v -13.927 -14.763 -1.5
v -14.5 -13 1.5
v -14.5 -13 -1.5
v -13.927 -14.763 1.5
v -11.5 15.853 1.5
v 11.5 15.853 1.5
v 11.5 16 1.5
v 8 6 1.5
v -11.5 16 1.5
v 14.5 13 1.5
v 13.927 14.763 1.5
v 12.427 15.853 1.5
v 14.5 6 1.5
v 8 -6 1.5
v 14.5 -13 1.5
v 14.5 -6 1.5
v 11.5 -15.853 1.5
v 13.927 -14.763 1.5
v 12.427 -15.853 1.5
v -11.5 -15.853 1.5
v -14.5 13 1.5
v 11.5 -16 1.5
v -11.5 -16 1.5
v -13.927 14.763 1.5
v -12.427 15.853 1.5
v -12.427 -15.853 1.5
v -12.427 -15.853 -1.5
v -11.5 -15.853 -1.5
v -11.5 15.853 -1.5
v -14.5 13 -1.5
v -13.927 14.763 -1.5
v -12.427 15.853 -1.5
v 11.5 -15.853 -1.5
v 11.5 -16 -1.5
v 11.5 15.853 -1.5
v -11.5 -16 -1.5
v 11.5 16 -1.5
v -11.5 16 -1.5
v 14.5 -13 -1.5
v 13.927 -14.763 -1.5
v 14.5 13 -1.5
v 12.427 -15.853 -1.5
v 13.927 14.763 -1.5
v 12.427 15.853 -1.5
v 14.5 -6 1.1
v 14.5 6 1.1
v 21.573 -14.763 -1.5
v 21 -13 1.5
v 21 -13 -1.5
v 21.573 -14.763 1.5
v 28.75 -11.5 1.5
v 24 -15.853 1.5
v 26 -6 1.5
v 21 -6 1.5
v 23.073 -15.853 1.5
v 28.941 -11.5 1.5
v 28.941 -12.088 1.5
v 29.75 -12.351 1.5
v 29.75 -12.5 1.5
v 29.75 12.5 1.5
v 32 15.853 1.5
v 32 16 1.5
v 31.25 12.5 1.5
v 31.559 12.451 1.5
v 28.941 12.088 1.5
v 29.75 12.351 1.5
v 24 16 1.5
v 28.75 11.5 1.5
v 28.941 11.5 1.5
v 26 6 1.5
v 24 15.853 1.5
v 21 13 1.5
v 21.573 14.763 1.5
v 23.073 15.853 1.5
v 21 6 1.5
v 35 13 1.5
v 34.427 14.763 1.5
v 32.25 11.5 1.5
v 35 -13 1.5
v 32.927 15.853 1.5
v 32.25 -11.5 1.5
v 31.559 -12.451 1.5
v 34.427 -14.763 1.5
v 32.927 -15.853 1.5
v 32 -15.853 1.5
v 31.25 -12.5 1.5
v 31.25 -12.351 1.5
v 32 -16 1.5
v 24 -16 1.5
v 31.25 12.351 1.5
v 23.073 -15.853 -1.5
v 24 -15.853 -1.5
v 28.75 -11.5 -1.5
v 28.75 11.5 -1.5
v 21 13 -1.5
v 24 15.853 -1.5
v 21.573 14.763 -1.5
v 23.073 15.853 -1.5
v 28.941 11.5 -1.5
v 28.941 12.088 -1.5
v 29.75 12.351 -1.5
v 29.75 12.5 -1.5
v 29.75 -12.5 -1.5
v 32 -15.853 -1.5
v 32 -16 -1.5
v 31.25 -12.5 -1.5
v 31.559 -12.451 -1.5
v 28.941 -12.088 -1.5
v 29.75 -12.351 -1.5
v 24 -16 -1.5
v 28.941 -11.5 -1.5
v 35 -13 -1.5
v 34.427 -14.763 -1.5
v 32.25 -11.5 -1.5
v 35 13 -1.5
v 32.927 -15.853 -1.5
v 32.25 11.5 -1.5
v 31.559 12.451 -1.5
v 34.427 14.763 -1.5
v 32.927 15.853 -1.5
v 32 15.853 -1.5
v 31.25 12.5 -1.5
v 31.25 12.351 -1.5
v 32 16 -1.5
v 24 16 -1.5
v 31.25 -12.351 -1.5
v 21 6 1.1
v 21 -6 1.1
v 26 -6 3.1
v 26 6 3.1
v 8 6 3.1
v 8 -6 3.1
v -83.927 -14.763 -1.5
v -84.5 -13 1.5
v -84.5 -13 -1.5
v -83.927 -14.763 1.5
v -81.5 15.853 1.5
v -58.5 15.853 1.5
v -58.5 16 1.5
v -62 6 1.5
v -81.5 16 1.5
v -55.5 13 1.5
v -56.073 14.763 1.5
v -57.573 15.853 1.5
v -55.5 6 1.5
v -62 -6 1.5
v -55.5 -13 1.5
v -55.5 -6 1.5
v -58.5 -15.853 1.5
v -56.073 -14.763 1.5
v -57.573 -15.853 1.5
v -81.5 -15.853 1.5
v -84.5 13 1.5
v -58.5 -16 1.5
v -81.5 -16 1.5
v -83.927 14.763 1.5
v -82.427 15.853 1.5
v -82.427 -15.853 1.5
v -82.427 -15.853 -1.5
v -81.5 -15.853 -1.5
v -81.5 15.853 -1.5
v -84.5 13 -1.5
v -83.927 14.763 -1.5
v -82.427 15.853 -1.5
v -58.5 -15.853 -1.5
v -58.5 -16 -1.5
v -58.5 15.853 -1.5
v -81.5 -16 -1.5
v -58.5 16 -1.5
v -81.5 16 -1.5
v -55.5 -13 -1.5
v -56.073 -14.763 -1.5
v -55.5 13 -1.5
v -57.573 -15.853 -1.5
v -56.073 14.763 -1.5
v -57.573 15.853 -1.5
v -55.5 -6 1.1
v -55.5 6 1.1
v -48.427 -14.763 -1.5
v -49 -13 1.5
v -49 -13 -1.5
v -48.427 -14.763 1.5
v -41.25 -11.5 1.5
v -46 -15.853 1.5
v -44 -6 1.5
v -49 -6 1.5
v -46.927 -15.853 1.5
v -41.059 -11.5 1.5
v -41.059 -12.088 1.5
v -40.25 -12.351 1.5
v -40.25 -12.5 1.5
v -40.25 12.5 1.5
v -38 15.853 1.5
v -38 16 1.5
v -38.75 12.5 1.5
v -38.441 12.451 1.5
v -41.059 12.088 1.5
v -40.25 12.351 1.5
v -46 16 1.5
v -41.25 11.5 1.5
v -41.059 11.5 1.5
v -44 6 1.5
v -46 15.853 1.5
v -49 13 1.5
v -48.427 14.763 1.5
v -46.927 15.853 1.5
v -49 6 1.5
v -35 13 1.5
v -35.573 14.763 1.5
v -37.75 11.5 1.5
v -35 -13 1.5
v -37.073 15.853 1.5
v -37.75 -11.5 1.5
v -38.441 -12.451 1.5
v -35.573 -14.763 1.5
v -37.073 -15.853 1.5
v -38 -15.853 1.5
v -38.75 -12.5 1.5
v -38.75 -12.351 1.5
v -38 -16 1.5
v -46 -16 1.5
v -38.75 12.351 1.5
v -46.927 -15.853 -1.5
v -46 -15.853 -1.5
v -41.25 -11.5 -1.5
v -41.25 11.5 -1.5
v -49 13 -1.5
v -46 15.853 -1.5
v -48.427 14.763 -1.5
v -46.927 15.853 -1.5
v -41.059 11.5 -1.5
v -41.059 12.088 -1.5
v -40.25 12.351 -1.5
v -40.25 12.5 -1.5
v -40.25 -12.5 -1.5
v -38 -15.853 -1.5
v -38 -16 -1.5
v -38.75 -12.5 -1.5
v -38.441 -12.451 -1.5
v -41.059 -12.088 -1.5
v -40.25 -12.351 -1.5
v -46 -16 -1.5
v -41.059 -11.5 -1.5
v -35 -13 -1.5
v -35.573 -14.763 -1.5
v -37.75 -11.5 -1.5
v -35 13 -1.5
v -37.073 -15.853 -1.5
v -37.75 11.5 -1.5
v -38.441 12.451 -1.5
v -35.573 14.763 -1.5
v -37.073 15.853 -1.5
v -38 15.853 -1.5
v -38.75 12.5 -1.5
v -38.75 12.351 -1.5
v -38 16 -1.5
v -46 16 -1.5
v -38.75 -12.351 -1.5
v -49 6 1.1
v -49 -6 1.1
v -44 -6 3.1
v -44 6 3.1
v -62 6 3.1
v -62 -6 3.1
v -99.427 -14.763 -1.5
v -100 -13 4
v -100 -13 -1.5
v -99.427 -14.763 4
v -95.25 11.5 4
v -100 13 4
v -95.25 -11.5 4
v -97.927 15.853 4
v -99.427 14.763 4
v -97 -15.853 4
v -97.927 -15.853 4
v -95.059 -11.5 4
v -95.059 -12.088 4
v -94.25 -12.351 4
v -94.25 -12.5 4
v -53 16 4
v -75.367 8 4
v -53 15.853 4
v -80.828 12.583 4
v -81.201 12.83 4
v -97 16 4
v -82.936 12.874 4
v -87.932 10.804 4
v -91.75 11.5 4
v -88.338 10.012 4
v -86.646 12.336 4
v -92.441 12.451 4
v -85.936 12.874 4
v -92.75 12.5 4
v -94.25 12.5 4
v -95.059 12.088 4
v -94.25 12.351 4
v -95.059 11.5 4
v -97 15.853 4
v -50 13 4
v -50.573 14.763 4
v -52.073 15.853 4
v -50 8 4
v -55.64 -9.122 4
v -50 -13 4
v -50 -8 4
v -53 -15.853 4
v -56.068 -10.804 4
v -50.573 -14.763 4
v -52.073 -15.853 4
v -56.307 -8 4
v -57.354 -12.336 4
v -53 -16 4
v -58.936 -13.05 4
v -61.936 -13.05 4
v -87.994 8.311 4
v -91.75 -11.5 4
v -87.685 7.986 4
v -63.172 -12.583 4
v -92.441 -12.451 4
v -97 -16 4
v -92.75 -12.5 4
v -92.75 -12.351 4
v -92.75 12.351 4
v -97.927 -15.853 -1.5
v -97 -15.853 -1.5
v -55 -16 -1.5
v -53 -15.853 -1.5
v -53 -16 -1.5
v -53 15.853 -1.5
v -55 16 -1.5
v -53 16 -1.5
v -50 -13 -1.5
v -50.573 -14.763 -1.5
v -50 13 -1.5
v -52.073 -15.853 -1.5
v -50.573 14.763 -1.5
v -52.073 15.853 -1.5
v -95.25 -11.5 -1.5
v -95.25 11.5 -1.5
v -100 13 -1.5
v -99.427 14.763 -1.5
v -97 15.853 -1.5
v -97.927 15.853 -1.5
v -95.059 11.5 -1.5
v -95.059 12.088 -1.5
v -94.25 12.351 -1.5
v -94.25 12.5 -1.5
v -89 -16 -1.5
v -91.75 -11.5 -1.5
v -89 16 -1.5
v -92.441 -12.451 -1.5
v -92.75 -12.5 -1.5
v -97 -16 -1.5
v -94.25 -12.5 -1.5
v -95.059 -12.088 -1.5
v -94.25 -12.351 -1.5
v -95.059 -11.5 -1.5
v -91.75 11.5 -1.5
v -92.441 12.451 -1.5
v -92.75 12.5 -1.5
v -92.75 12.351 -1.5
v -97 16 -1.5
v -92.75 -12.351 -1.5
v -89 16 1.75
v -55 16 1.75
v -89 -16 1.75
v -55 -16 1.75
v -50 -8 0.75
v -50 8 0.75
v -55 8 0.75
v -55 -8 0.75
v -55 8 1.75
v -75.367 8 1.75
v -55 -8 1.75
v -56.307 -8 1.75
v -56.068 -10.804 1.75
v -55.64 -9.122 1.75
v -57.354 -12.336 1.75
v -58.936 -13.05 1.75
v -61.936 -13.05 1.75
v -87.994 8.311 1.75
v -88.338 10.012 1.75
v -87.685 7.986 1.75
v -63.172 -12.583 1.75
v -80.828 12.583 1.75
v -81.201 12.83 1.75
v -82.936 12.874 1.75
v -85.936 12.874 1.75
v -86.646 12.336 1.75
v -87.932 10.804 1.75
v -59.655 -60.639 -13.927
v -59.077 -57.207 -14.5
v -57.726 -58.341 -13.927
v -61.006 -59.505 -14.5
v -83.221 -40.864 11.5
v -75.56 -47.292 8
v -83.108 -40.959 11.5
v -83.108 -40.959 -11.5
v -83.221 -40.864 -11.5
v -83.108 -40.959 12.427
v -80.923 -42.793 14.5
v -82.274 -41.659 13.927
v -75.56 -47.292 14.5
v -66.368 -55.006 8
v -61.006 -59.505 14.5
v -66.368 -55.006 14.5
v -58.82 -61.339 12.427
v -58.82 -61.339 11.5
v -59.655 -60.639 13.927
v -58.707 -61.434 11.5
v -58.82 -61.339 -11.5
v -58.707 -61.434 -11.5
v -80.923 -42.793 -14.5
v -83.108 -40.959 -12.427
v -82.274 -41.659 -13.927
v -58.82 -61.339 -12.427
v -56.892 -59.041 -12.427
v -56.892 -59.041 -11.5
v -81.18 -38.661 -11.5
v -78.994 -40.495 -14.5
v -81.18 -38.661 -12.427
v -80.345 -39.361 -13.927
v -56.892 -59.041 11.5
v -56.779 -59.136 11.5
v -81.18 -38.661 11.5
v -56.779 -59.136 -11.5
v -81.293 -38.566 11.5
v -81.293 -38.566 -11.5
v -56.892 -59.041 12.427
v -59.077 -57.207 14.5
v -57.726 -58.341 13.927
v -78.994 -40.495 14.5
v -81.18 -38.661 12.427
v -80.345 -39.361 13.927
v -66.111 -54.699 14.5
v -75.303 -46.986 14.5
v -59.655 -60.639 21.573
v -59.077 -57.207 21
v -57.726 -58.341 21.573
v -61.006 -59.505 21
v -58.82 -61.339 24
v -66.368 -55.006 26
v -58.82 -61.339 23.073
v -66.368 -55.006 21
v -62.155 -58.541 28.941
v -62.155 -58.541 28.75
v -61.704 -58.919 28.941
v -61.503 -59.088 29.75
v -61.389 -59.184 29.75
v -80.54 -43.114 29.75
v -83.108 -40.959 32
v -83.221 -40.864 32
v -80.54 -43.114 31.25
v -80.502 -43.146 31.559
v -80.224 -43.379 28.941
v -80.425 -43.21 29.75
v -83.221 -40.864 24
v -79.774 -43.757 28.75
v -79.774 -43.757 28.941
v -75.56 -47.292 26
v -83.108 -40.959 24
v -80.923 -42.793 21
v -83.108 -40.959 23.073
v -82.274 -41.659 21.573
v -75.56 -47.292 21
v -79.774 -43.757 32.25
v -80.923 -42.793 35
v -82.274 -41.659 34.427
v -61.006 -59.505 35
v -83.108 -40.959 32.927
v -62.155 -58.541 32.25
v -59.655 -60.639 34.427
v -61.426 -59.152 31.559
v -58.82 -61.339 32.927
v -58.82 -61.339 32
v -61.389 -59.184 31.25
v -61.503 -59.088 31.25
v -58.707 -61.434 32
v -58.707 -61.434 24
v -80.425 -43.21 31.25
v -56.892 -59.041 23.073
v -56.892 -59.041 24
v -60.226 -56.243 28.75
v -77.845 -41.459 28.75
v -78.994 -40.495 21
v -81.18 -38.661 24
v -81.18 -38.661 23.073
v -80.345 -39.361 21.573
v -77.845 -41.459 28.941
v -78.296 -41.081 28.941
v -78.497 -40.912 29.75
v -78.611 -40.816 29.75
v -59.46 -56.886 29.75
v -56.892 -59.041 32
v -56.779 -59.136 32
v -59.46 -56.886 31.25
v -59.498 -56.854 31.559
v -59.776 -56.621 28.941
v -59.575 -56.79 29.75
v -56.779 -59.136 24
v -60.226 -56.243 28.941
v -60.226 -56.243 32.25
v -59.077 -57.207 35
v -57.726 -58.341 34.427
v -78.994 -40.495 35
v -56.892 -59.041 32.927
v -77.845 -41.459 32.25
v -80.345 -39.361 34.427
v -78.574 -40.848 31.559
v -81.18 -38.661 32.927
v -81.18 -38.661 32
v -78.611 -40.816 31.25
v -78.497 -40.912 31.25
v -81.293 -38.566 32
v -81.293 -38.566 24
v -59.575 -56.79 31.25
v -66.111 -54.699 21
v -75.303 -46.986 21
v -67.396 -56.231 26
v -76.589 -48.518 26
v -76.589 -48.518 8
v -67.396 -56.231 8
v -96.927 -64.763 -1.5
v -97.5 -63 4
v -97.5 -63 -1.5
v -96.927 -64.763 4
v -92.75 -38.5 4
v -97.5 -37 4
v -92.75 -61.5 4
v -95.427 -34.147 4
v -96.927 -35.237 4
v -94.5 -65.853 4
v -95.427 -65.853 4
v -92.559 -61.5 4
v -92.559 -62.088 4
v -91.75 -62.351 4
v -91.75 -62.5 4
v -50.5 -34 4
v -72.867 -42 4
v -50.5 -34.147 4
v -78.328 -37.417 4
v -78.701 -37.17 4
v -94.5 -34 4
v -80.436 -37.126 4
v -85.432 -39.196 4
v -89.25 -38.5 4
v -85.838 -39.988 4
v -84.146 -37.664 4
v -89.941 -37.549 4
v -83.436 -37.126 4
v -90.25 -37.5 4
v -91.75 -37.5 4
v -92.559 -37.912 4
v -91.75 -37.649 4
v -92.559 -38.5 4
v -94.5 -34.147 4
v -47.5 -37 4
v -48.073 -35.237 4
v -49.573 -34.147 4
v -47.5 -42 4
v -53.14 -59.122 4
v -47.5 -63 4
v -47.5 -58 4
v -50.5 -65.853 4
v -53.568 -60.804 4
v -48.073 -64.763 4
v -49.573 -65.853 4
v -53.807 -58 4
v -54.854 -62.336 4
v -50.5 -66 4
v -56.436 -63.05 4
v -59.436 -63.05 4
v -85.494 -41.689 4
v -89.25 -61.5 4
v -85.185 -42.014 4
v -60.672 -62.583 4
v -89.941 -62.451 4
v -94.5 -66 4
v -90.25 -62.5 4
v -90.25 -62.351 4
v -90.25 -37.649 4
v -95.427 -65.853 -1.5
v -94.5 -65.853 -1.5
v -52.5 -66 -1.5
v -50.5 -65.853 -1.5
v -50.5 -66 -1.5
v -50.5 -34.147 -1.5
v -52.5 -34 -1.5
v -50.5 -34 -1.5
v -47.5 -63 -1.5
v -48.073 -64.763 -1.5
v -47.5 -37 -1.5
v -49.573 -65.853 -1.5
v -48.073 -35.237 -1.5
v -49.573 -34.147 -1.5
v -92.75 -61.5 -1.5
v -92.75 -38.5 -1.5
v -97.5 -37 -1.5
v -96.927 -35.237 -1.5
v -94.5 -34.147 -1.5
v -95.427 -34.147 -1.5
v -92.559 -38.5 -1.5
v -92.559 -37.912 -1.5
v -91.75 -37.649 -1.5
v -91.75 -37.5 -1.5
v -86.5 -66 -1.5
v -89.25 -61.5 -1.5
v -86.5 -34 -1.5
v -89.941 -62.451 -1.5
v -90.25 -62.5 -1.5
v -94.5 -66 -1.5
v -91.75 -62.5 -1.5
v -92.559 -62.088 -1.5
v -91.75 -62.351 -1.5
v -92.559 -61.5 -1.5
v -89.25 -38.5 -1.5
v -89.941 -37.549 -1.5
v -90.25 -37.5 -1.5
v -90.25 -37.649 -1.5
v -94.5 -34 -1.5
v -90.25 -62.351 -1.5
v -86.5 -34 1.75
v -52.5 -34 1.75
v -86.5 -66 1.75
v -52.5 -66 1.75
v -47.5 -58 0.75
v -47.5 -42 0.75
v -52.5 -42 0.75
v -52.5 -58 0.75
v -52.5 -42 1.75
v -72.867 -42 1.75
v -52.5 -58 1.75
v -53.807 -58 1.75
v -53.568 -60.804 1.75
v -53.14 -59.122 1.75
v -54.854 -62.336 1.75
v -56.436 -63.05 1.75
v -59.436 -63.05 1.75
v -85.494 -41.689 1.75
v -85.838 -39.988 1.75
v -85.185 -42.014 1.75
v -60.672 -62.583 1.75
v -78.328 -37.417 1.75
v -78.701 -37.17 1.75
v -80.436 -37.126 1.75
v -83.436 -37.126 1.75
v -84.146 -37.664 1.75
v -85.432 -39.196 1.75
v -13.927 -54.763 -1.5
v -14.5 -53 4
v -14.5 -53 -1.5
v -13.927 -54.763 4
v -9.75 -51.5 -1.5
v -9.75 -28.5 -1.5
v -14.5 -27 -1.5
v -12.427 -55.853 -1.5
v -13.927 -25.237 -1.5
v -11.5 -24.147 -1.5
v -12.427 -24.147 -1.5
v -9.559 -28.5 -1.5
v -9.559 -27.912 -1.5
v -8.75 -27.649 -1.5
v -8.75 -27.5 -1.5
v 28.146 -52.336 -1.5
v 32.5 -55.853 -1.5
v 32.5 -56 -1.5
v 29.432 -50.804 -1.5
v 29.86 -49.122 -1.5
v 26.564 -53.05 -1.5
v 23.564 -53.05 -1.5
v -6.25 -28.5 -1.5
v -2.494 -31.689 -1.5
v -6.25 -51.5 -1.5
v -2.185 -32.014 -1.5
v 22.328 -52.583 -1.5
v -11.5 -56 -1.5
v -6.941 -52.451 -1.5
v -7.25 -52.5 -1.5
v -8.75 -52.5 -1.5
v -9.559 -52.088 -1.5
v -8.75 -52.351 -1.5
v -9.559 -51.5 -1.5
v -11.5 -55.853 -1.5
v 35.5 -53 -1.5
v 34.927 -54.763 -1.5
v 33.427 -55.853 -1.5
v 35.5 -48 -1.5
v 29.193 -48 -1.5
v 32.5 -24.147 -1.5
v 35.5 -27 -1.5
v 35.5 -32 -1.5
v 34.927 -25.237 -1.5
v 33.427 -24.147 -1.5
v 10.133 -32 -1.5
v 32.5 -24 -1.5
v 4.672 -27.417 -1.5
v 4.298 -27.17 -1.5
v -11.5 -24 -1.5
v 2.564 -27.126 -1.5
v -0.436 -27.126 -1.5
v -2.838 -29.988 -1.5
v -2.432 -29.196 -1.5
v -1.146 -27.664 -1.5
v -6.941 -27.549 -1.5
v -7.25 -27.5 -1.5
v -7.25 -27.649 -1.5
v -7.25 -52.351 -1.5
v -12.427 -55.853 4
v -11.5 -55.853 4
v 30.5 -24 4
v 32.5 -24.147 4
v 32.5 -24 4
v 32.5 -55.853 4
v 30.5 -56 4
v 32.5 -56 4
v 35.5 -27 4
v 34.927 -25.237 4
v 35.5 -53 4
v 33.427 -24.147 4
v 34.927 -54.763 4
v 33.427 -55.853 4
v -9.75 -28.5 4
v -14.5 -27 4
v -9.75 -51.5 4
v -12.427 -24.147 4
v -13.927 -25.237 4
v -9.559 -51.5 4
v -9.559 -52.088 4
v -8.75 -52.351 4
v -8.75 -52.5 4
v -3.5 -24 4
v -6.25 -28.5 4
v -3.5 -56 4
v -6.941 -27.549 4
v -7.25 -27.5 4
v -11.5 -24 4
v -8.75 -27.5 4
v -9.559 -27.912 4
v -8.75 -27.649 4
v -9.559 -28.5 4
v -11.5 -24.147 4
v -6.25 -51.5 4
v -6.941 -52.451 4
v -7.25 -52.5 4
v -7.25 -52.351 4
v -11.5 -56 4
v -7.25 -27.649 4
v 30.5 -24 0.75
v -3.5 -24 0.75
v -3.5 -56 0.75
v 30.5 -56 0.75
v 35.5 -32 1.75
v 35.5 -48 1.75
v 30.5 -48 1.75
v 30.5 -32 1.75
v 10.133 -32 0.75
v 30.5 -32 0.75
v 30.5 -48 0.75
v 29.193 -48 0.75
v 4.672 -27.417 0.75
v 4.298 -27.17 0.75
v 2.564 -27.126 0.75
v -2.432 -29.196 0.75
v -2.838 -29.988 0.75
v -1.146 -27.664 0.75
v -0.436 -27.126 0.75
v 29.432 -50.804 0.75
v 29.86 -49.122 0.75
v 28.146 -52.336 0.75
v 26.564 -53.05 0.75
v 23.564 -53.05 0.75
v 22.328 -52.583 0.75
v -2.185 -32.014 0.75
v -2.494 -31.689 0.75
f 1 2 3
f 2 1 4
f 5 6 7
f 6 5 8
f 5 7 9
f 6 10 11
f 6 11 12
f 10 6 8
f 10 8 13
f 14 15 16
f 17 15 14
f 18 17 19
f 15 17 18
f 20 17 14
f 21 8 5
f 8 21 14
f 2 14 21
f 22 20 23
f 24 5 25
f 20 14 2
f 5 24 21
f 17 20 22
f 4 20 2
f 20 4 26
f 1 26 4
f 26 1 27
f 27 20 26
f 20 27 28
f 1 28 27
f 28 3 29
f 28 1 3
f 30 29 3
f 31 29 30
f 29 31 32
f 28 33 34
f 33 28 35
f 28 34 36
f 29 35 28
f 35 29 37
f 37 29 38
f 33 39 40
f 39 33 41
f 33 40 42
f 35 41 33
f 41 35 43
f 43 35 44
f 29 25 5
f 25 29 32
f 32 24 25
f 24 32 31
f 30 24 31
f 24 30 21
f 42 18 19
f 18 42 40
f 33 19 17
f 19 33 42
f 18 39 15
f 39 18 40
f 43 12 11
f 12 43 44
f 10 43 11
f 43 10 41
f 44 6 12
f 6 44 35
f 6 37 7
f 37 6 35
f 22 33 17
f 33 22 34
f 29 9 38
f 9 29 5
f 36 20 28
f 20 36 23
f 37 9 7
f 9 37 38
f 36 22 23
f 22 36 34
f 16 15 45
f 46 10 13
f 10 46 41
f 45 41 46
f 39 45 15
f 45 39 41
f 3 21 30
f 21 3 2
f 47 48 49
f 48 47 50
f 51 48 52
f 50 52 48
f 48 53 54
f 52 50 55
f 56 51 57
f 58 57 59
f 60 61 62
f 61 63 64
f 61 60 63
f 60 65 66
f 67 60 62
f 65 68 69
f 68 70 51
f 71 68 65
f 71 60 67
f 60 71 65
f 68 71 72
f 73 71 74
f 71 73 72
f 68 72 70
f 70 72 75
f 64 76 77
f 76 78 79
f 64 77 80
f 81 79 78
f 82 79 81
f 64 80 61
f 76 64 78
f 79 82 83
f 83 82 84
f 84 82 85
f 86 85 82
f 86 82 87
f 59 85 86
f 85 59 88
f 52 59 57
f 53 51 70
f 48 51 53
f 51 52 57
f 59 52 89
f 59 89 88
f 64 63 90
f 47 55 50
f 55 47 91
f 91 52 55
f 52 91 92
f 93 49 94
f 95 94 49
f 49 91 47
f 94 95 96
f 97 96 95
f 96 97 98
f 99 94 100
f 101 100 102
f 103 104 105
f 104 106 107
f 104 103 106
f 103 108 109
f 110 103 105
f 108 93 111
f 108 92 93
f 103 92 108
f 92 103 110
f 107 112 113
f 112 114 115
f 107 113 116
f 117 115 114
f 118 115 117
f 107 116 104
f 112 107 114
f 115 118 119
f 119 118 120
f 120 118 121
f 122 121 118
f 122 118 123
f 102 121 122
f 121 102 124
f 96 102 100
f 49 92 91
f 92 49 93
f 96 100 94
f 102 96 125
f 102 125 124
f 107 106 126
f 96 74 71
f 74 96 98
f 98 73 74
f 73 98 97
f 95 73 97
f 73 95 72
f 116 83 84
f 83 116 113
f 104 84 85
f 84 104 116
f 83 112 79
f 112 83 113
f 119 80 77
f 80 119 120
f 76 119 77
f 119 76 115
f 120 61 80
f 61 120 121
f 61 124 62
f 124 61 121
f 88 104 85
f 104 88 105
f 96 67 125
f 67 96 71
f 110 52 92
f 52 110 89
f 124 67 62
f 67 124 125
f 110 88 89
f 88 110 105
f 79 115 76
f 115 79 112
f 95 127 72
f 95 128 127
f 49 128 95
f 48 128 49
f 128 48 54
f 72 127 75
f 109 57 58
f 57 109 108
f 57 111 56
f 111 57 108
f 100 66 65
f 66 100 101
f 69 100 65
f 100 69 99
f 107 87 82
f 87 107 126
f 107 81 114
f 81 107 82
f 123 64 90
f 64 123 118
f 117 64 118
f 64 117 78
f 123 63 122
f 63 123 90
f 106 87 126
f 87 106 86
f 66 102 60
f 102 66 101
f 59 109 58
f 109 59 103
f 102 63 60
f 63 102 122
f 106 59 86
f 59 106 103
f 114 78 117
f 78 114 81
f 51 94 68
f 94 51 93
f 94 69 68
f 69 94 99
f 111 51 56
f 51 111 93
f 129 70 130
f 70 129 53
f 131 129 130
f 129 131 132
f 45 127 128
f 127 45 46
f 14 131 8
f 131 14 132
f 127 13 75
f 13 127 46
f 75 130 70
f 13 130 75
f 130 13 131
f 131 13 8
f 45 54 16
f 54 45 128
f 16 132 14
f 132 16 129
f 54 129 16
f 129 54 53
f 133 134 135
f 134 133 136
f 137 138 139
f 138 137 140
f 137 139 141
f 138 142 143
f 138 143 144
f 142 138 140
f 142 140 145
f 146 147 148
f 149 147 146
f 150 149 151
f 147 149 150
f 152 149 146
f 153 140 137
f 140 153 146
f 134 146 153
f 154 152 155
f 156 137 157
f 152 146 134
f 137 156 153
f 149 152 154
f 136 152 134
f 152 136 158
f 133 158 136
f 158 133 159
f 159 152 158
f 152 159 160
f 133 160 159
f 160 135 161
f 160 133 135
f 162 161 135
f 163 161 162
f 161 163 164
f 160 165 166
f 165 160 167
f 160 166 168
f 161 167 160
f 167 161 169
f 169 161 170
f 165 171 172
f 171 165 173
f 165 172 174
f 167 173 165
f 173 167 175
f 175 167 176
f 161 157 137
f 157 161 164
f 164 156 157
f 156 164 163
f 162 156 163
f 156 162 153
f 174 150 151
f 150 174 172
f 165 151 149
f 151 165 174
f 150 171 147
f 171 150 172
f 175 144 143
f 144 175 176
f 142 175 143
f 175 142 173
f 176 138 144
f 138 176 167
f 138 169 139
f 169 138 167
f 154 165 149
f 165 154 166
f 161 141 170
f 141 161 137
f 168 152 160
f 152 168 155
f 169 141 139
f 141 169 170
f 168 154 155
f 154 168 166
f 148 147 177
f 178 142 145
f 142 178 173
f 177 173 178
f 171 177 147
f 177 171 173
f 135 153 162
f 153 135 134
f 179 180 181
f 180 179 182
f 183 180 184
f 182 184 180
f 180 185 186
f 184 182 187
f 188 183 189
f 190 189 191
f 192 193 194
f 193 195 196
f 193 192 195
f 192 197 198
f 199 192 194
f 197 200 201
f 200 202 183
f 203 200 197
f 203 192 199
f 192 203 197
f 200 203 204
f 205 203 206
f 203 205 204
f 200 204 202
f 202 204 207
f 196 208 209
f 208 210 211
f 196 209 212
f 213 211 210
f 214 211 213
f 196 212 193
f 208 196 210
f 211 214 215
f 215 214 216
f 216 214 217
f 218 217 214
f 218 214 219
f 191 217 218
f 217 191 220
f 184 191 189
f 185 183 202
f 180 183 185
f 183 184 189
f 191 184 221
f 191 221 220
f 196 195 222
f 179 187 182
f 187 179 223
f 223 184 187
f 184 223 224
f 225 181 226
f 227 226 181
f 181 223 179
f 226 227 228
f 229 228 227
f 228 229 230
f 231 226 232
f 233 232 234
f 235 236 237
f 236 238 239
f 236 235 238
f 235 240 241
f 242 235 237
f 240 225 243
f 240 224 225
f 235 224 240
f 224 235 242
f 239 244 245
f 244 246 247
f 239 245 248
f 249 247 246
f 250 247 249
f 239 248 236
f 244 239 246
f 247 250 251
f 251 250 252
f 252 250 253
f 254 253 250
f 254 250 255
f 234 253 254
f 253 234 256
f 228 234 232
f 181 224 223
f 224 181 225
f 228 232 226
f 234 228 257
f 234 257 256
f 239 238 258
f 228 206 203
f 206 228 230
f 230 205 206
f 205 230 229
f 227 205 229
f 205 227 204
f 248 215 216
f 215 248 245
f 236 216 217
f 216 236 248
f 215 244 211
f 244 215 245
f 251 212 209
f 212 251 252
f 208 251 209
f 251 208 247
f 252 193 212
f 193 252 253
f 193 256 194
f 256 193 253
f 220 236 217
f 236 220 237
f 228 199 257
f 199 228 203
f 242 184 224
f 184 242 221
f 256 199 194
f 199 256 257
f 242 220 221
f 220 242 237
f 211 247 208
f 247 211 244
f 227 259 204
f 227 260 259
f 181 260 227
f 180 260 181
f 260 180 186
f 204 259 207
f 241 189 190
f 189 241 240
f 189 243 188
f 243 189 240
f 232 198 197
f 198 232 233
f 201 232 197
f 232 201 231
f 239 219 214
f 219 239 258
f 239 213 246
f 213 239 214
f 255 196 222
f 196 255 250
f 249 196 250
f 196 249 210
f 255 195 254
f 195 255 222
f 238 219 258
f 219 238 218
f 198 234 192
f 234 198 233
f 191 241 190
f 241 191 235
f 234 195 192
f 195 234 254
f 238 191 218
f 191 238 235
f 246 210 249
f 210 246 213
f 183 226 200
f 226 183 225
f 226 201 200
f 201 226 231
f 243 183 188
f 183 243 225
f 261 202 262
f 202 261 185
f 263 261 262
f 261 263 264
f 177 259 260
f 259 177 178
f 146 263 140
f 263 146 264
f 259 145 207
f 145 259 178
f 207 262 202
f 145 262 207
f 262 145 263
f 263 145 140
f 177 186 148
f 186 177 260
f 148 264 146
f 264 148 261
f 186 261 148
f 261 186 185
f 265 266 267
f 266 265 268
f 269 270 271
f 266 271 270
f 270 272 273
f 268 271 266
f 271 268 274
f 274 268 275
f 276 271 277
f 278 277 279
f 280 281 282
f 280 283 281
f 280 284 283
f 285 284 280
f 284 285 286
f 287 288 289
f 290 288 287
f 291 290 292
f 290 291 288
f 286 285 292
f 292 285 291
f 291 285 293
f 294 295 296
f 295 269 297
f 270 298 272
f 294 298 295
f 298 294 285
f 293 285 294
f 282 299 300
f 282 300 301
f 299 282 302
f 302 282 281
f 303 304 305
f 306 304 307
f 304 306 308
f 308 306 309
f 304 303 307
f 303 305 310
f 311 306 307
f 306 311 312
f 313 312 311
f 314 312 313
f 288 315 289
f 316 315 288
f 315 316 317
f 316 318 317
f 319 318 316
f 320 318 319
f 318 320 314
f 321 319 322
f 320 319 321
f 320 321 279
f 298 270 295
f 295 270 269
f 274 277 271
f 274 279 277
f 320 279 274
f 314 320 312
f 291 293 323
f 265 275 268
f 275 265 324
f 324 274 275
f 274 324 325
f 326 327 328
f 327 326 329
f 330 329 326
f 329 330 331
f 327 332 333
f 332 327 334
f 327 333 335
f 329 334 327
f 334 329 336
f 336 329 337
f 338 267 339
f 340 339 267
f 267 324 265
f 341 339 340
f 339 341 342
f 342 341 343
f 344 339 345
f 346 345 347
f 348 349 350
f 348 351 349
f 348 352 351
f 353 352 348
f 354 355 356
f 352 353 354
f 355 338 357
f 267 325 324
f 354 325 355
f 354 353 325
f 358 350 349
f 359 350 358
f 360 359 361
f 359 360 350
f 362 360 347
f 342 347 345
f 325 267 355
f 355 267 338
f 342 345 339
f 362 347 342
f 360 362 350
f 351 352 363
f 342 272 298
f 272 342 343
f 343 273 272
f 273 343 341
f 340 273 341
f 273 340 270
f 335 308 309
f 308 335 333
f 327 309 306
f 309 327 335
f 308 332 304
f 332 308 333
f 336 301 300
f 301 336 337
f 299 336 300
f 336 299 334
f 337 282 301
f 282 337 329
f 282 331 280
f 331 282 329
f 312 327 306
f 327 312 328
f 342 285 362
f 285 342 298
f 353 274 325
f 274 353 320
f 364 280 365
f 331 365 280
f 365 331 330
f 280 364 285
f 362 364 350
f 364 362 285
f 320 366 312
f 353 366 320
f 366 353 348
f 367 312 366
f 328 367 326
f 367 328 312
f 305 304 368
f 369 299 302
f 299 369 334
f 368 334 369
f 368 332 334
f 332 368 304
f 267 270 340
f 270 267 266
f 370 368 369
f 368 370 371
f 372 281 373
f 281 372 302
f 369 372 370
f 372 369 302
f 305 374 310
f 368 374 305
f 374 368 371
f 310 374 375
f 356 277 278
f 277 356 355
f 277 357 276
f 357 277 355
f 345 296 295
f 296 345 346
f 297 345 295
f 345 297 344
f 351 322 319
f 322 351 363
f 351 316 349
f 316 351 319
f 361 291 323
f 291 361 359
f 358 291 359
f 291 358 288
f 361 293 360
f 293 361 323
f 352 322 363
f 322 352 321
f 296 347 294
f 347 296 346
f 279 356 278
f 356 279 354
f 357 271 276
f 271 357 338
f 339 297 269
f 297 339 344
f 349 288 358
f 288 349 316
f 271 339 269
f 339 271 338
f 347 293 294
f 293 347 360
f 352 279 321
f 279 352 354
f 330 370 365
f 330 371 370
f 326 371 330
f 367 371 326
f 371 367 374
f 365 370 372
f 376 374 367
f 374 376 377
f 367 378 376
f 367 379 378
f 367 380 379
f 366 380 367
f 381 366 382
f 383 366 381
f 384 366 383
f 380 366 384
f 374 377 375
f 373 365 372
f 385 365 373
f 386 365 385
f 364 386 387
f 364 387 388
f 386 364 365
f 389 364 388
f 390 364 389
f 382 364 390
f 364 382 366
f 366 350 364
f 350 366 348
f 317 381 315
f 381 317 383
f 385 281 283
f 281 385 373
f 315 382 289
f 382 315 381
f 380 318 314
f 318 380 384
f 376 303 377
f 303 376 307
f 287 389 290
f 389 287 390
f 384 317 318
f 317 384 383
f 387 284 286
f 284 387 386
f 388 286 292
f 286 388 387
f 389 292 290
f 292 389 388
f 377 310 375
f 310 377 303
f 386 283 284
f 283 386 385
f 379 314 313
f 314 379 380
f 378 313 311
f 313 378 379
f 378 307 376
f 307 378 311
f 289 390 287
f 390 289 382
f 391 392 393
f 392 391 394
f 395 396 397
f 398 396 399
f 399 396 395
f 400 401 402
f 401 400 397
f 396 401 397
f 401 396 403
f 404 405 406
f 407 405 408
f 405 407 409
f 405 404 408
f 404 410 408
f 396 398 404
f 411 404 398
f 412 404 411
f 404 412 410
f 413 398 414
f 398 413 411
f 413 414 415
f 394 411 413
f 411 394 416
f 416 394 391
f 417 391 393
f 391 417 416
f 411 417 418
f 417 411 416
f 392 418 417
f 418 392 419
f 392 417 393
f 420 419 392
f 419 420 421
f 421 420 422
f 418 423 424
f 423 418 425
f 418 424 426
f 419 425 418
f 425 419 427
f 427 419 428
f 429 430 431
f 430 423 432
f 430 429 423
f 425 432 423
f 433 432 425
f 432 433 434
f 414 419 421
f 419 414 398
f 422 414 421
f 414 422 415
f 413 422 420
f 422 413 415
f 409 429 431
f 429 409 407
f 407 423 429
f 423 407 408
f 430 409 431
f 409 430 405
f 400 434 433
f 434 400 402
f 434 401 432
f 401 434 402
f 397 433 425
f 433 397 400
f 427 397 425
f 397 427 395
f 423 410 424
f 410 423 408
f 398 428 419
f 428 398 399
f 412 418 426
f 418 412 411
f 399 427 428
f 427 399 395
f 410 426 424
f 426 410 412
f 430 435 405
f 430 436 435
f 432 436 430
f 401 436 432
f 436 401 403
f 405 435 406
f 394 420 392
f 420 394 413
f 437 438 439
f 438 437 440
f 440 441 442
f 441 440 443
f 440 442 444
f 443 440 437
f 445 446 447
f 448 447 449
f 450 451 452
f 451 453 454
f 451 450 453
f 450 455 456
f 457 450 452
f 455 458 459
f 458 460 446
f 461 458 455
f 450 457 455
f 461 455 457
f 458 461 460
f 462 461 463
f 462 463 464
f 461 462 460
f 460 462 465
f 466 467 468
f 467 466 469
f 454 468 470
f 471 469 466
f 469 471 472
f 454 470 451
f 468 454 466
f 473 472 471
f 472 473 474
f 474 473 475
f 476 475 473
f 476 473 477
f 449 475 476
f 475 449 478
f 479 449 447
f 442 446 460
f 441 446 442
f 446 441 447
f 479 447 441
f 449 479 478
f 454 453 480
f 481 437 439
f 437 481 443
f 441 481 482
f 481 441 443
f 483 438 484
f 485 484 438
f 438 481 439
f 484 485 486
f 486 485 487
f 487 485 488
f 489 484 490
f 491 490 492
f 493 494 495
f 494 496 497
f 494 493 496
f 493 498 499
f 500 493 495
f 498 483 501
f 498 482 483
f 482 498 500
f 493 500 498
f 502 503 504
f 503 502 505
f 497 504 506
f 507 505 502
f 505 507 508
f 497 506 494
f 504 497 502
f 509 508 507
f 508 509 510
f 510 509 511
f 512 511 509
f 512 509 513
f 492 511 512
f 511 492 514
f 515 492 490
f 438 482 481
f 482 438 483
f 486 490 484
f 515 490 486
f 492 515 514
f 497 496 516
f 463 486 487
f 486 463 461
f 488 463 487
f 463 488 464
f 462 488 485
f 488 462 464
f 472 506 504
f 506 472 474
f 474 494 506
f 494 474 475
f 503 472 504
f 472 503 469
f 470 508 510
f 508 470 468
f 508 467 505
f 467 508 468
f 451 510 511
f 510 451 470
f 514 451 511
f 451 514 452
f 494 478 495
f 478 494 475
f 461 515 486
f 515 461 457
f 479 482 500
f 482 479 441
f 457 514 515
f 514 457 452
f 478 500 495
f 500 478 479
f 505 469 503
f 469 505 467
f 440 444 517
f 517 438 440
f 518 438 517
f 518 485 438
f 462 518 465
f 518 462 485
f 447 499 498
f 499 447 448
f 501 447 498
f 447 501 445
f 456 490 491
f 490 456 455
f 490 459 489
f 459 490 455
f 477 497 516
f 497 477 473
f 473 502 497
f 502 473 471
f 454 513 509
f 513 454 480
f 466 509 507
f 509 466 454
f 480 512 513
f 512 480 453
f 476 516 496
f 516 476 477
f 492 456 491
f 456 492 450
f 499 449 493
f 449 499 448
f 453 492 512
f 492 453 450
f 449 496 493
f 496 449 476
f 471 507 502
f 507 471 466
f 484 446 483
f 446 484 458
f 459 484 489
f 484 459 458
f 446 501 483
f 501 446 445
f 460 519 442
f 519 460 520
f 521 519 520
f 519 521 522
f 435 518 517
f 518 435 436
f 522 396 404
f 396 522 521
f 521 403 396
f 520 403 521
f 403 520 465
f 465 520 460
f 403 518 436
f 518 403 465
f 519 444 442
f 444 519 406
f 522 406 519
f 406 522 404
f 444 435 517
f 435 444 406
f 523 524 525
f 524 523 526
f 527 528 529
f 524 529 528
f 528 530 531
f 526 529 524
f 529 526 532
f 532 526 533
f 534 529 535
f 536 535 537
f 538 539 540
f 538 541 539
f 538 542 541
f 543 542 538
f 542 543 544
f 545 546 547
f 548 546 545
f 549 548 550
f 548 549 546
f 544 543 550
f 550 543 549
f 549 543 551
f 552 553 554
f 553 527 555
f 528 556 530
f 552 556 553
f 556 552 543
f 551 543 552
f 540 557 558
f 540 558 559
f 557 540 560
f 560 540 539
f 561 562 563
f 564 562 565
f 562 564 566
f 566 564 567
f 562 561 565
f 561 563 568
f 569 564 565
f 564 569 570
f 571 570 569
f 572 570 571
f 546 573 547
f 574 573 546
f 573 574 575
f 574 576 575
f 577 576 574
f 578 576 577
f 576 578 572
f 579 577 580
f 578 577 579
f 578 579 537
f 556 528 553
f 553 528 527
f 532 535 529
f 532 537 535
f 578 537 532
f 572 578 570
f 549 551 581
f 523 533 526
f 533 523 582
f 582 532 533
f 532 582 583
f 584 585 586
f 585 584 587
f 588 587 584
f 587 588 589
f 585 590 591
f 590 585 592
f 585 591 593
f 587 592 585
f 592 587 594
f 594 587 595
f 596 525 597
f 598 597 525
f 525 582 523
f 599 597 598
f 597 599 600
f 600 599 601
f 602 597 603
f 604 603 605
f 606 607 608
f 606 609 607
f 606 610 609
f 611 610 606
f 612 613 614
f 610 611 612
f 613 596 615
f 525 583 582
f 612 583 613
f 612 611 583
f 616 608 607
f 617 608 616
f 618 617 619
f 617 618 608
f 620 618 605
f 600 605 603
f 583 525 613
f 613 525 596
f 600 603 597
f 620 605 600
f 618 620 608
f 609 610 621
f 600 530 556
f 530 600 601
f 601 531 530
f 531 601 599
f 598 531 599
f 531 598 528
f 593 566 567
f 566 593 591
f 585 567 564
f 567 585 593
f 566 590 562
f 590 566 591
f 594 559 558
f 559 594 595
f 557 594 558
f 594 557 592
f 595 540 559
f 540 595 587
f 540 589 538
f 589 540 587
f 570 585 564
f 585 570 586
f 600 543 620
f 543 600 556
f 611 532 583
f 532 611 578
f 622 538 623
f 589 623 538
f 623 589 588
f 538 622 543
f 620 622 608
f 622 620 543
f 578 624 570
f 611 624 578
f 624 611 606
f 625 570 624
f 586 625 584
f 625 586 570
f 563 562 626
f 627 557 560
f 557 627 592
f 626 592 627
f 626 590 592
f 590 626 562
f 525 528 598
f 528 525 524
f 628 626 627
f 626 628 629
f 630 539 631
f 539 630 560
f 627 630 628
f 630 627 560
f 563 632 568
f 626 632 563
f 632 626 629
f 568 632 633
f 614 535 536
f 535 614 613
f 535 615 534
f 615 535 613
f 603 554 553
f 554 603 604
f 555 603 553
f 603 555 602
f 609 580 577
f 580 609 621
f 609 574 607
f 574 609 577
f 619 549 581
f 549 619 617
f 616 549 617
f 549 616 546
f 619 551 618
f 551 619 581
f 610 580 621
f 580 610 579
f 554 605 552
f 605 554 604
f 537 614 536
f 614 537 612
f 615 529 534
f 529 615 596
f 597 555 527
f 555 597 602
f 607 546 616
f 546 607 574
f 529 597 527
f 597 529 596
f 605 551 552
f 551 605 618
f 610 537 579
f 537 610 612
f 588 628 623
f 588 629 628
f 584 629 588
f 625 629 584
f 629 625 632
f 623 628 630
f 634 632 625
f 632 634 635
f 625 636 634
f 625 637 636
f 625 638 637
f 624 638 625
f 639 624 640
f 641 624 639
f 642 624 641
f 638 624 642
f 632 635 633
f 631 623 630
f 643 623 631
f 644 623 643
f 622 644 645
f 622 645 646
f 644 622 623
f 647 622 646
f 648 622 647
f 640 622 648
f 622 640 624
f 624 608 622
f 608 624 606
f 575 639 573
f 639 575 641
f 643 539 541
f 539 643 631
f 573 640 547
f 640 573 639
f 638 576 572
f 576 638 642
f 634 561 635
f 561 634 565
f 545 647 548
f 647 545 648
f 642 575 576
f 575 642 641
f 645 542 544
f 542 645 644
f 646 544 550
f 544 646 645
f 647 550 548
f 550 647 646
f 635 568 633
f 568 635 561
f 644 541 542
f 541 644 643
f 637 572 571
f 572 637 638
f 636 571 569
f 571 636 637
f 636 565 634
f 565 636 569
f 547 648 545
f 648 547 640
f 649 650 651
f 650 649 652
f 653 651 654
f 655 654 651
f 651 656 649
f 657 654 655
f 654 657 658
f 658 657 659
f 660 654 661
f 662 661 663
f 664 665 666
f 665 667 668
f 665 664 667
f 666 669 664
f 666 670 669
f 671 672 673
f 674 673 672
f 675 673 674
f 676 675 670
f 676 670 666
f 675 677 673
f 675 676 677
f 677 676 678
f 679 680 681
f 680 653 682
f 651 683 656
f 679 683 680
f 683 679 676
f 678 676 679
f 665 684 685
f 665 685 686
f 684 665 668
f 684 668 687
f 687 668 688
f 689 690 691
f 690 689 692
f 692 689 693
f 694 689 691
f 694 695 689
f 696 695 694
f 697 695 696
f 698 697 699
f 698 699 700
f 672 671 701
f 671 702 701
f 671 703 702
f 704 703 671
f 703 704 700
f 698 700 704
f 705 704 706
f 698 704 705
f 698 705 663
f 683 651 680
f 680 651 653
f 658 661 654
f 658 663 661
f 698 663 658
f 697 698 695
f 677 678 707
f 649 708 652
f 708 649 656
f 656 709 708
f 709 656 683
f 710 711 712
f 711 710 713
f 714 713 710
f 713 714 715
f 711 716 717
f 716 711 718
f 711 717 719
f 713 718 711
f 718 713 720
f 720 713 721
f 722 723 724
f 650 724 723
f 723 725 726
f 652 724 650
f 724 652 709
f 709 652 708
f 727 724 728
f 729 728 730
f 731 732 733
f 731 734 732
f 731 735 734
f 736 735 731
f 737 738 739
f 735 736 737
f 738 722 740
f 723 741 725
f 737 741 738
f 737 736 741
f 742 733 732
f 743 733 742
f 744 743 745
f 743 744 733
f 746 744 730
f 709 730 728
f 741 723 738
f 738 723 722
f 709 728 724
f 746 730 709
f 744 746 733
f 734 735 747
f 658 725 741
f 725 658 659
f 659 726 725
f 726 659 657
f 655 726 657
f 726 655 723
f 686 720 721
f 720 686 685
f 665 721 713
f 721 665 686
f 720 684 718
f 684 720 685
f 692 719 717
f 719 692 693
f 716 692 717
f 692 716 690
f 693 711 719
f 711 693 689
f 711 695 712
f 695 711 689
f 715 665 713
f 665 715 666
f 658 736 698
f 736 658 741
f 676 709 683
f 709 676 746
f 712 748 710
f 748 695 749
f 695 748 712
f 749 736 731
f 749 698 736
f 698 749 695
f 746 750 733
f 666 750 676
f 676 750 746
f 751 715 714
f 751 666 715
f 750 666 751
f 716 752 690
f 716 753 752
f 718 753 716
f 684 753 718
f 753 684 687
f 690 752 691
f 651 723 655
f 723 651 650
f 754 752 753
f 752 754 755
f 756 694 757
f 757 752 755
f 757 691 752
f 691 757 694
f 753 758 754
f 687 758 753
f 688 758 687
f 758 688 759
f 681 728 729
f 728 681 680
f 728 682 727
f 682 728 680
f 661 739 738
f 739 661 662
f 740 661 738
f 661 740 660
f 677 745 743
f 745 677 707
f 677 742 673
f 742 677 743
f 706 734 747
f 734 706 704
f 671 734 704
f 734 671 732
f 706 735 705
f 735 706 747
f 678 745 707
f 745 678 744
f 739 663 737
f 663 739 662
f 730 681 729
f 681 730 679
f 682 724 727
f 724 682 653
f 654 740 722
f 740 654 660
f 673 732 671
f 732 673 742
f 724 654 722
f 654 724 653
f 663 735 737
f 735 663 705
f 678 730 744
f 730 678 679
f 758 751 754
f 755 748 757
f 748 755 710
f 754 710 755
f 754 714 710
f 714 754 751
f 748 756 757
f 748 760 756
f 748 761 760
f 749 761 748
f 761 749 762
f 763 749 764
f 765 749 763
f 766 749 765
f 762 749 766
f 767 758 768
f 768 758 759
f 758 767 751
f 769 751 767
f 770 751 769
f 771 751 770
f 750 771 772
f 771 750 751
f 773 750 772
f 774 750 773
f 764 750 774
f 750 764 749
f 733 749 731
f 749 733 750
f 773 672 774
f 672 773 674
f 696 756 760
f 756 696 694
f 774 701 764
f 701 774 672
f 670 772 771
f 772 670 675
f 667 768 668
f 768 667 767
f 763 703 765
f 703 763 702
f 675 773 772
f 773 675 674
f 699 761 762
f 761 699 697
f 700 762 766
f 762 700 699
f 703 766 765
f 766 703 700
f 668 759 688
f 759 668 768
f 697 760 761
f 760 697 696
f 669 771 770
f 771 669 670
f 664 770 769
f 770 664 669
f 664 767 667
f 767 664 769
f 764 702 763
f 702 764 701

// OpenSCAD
// file: clamp_f.scad
use<MCAD/boxes.scad>;
use<MCAD/triangles.scad>;

use<clamp.scad>;

//$fn=20;
module clamp_female() {
	difference() {
		color("green", 0.5) translate([-2.5,0,0])
			roundedBox([50,32,5.5], 3, true);
		socket_2();
		color("blue", 0.5) translate([0.5,0,-2])
			cube([34,36,5], center=true);
		translate([2,0,0]) socket();
		translate([-21,0,0]) roundedBox([3.5,25,29], 1, false);
	}
	
}

module socket_2() {
	difference() {
		color("red", 0.5) translate([10,0,2]) cube([26,16,5], center=true);
		translate([0,-5,2]) rotate([0,0,45])
			cube([10,10,10], center=true);
	}
}

module socket() {
	hull() {
		rotate([0,0,-40])
			roundedBox([36,6,29], 2, false);
		translate([-3,0,0]) rotate([0,0,-40])
			roundedBox([36,6,29], 2, false);
	}
}
// file: clamp.scad
//$fn=20;
use<MCAD/boxes.scad>;
use<MCAD/triangles.scad>;

module clamp_male() {
	roundedBox([29,32,3], 3, true);

	difference() {
		translate([28,0,0]) roundedBox([14,32,3], 3, true);
		translate([30.5,0,0.5]) roundedBox([3.5,25,4], 1, true);
	}
	translate([17,0,2.1]) cube([18,12,2], center=true);
	//translate([8,6,0]) rotate([90,-90,0]) triangle(13,3.1,12);
	//translate([26,-6,1.35]) rotate([90,-90,180]) a_triangle(45,1.75,12);
}

clamp_male();
// main file
use<clamp.scad>;
use<clamp_f.scad>;


module for_print() {
	clamp_male();
	translate([13,-40,1.25]) mirror([0,0,1]) clamp_female();
}

module for_presentation() {
	clamp_male();
	translate([-2.5,0,1.25]) clamp_female();
}

module for_presentation2() {
	rotate([50,-90,0]) clamp_male();
	translate([0,0,1.25]) clamp_female();
}

translate([-70,0,0]) for_presentation();
translate([-70,-50,0]) for_presentation2();
for_print();
